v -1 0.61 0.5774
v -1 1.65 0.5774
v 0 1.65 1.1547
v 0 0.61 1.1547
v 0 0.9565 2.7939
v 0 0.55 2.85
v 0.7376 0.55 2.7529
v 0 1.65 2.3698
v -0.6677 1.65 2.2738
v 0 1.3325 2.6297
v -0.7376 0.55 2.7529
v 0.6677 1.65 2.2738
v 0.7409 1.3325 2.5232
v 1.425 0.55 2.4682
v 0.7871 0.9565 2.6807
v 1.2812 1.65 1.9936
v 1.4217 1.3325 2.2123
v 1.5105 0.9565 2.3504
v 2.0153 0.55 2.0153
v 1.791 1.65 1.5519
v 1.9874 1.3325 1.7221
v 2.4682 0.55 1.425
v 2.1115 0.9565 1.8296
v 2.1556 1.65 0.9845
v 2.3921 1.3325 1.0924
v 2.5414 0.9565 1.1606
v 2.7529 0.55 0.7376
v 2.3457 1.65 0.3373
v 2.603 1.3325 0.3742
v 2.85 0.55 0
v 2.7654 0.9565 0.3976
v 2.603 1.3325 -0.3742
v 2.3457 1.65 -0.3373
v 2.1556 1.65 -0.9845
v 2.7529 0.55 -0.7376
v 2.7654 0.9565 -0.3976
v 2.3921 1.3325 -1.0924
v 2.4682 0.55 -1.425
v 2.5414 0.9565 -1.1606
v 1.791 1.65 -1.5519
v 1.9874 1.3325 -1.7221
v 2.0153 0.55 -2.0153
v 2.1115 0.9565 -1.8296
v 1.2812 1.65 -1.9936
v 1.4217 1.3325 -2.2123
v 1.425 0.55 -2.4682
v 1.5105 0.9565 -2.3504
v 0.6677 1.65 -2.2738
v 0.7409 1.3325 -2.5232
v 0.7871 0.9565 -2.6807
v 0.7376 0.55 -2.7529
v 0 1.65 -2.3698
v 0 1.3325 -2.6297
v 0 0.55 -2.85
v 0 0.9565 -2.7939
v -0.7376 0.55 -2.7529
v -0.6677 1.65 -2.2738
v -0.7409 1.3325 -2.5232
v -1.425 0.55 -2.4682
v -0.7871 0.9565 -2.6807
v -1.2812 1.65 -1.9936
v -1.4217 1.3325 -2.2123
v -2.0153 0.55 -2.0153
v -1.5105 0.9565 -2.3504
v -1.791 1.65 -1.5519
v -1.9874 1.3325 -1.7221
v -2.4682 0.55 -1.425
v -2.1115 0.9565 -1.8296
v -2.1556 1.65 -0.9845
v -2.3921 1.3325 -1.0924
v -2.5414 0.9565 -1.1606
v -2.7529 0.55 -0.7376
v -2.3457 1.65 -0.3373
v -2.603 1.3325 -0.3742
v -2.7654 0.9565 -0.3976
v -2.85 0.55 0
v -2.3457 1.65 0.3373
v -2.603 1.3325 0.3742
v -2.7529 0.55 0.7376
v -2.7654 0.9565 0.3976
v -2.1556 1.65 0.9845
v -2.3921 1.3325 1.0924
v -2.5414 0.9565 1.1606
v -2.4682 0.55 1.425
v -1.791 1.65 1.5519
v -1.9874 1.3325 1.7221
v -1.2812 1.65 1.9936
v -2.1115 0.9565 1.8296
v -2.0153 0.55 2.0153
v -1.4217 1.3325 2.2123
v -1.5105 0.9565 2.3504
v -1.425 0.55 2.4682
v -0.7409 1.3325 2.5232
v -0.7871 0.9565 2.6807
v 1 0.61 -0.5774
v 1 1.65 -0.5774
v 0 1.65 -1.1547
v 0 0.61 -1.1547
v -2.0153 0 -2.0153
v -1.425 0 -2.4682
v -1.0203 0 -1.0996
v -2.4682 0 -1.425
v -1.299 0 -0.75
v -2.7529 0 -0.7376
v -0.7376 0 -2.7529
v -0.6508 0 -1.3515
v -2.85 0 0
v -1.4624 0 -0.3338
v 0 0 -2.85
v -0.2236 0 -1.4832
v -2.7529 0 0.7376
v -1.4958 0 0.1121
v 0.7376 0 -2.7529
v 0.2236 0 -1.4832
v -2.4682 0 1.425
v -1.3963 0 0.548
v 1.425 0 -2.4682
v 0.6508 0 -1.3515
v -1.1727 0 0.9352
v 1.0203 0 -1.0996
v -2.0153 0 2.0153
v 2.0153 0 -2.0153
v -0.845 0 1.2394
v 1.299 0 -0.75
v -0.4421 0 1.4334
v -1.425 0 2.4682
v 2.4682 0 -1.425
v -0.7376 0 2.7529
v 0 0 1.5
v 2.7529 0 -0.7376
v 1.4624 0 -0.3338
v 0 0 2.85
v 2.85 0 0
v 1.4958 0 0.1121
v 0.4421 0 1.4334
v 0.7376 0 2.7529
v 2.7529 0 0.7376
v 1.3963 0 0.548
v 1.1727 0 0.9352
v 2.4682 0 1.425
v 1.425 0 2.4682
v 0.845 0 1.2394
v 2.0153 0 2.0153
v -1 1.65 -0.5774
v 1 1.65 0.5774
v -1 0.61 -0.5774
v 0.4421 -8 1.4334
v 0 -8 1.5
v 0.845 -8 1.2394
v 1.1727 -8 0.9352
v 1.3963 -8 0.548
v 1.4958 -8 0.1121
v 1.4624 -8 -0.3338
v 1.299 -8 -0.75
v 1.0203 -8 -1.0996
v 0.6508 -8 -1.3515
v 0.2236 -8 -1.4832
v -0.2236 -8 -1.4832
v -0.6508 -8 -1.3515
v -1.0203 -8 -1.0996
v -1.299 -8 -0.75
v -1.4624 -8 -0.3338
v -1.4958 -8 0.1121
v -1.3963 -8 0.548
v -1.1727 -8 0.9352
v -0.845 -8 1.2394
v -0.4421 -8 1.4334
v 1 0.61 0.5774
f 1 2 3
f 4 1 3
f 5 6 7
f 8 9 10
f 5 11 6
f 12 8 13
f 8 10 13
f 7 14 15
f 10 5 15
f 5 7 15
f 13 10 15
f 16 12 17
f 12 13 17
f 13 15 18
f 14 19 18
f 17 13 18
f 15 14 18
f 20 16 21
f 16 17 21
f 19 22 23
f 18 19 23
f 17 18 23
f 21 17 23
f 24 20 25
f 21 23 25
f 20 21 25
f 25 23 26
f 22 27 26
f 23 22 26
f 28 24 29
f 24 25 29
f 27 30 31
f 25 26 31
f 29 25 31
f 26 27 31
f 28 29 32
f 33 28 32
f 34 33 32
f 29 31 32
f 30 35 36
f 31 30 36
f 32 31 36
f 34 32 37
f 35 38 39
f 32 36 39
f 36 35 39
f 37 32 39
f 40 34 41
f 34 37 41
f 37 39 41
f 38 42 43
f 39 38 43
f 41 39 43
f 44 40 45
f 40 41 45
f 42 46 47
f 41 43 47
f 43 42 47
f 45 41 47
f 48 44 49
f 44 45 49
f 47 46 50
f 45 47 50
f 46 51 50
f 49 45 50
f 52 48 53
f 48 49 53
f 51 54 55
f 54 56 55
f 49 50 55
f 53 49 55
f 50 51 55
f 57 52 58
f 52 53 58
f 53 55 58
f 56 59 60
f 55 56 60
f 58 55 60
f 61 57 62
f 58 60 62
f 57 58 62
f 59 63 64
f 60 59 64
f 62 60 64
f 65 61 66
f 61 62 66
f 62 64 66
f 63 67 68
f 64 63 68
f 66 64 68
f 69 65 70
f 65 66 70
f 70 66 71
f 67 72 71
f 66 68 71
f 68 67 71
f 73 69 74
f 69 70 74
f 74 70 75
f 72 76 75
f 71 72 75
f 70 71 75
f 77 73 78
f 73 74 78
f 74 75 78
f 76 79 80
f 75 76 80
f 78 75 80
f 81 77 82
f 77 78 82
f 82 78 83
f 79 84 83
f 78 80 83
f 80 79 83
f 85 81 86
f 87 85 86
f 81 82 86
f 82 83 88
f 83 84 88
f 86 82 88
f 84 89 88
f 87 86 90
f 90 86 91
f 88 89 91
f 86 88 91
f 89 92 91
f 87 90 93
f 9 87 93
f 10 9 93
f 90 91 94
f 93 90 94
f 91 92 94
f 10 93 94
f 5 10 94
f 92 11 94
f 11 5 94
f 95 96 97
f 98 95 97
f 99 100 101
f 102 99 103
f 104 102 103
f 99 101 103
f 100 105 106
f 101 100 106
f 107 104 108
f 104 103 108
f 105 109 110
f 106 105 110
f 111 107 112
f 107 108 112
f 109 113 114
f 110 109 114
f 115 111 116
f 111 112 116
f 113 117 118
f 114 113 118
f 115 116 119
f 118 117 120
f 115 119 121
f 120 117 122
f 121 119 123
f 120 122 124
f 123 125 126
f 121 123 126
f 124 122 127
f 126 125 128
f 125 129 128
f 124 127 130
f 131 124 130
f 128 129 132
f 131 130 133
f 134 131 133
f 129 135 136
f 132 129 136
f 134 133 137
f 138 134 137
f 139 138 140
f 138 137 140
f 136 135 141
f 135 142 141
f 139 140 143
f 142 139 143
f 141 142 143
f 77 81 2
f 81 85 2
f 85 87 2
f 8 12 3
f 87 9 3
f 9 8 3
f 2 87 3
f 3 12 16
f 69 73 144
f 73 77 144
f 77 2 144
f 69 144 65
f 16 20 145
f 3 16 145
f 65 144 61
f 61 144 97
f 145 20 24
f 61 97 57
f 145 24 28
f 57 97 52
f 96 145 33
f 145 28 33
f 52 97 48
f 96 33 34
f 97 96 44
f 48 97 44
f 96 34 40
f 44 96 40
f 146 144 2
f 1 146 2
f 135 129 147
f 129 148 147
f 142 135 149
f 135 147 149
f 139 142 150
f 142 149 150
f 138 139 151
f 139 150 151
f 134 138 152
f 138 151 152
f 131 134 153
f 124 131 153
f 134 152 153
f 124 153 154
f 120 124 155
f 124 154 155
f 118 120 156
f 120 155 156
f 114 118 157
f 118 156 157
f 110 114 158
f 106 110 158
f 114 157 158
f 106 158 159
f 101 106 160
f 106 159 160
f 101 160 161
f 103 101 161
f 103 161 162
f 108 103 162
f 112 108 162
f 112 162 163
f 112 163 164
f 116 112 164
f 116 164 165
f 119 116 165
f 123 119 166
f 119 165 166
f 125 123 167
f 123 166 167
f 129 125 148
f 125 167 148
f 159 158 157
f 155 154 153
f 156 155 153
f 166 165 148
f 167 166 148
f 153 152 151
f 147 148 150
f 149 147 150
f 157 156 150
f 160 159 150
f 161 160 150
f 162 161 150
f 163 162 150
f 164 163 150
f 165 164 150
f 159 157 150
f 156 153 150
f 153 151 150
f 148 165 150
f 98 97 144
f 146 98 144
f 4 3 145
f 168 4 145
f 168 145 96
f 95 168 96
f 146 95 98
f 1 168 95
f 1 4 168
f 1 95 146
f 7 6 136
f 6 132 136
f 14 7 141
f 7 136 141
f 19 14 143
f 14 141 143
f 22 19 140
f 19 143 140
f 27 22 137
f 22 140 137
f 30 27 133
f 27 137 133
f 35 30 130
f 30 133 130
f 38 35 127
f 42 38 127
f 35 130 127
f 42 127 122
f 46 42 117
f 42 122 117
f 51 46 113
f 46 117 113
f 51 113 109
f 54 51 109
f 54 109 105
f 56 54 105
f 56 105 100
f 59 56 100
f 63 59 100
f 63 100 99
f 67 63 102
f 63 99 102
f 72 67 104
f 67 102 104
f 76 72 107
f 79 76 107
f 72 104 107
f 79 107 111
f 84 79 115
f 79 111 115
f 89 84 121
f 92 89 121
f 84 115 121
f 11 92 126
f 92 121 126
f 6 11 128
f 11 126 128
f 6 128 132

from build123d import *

# Parameters (mm, degrees)
F4_DEPTH = 1.04


with BuildPart() as f2:
    # F1 (on Right) → F2 (revolve)
    with BuildSketch(Plane.YZ):
        with BuildLine():
            Line((-8, 0), (1.65, 0))
            Line((1.65, 0), (1.65, 2.3698039027))
            ThreePointArc((1.65, 2.3698039027), (1.1501225483, 2.7247192175), (0.55, 2.85))
            Line((0.55, 2.85), (0, 2.85))
            Line((0, 2.85), (0, 1.5))
            Line((0, 1.5), (-8, 1.5))
            Line((-8, 1.5), (-8, 0))
        make_face()
    revolve(axis=Axis((0, -3.175, 0), (0, 1, 0)))

    # F3 (on face) → F4 (cut)
    with BuildSketch(Plane(origin=(0, 1.65, 0), x_dir=(-1, 0, 0), z_dir=(0, 1, 0))):
        Polygon((-1, 0.5773502692), (-1, -0.5773502692), (0, -1.1547005384), (1, -0.5773502692), (1, 0.5773502692), (0, 1.1547005384), align=None)
    extrude(amount=-F4_DEPTH, mode=Mode.SUBTRACT)


solid = f2.part
